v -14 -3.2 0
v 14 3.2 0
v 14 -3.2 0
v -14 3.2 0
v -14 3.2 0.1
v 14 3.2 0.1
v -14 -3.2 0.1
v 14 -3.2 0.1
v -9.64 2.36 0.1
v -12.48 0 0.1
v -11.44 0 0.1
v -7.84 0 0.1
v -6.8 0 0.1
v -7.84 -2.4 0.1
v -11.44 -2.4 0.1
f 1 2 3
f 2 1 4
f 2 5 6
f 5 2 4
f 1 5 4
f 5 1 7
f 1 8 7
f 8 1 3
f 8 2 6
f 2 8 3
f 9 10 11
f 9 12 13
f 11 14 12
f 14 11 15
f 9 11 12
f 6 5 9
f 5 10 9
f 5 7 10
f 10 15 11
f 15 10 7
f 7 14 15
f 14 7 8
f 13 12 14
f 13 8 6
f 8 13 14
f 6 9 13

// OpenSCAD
// file: ../p/box5-12.scad
use <../lib.scad>
function ldraw_lib__box5_12() = [
// 0 Box with 5 Faces without Any Edges
// 0 Name: box5-12.dat
// 0 Author: Chris Dee [cwdee]
// 0 !LDRAW_ORG Primitive UPDATE 2009-02
// 0 !LICENSE Licensed under CC BY 4.0 : see CAreadme.txt
// 
// 0 BFC CERTIFY CCW
  [0,"BFC","CERTIFY"],
  [0,"BFC","CCW"],
// 
// 0 !HISTORY 2009-09-03 [PTadmin] Official Update 2009-02
// 
// 
// 4 16 1 1 1 1 1 -1 -1 1 -1 -1 1 1
  [4,16,1,1,1,1,1,-1,-1,1,-1,-1,1,1],
// 4 16 -1 0 1 1 0 1 1 1 1 -1 1 1
  [4,16,-1,0,1,1,0,1,1,1,1,-1,1,1],
// 4 16 -1 0 -1 -1 0 1 -1 1 1 -1 1 -1
  [4,16,-1,0,-1,-1,0,1,-1,1,1,-1,1,-1],
// 4 16 1 0 -1 -1 0 -1 -1 1 -1 1 1 -1
  [4,16,1,0,-1,-1,0,-1,-1,1,-1,1,1,-1],
// 4 16 1 0 1 1 0 -1 1 1 -1 1 1 1
  [4,16,1,0,1,1,0,-1,1,1,-1,1,1,1],
// 0
];
module ldraw_lib__box5_12(step=0, col=false, unit=2/5, alt=false, line=0.2, solid=!$preview)
    makepoly(ldraw_lib__box5_12(), step=step, col=col, unit=unit, alt=alt, line=line, solid=solid);
ldraw_lib__box5_12(line=0.2);
// main file
use <../lib.scad>
use <../p/box5-12.scad>
function ldraw_lib__821577l() = [
// 0 Sticker  0.8 x  3.5 with Green Arrow on Black Background
// 0 Name: 821577l.dat
// 0 Author: Evert-Jan Boer [ejboer]
// 0 !LDRAW_ORG Part UPDATE 2026-07
// 0 !LICENSE Licensed under CC BY 4.0 : see CAreadme.txt
// 
// 0 BFC CERTIFY CCW
  [0,"BFC","CERTIFY"],
  [0,"BFC","CCW"],
// 
// 0 !CATEGORY Sticker
// 0 !KEYWORDS Multi Control, Set 8082
// 
// 0 !HISTORY 2026-07-30 [OrionP] Official Update 2026-07
// 
// 1 16 0 -.25 0 35 0 0 0 0.25 0 0 0 8 box5-12.dat
  [1,16,0,-.25,0,35,0,0,0,0.25,0,0,0,8, ldraw_lib__box5_12()],
// 3 2 -24.1 -.25 5.9 -31.2 -.25 0 -28.6 -.25 0
  [3,2,-24.1,-.25,5.9,-31.2,-.25,0,-28.6,-.25,0],
// 3 2 -24.1 -.25 5.9 -19.6 -.25 0 -17 -.25 0
  [3,2,-24.1,-.25,5.9,-19.6,-.25,0,-17,-.25,0],
// 4 2 -19.6 -.25 -6 -19.6 -.25 0 -28.6 -.25 0 -28.6 -.25 -6
  [4,2,-19.6,-.25,-6,-19.6,-.25,0,-28.6,-.25,0,-28.6,-.25,-6],
// 3 2 -24.1 -.25 5.9 -28.6 -.25 0 -19.6 -.25 0
  [3,2,-24.1,-.25,5.9,-28.6,-.25,0,-19.6,-.25,0],
// 3 0 35 -.25 8 -35 -.25 8 -24.1 -.25 5.9
  [3,0,35,-.25,8,-35,-.25,8,-24.1,-.25,5.9],
// 3 0 -35 -.25 8 -31.2 -.25 0 -24.1 -.25 5.9
  [3,0,-35,-.25,8,-31.2,-.25,0,-24.1,-.25,5.9],
// 3 0 -35 -.25 8 -35 -.25 -8 -31.2 -.25 0
  [3,0,-35,-.25,8,-35,-.25,-8,-31.2,-.25,0],
// 4 0 -31.2 -.25 0 -35 -.25 -8 -28.6 -.25 -6 -28.6 -.25 0
  [4,0,-31.2,-.25,0,-35,-.25,-8,-28.6,-.25,-6,-28.6,-.25,0],
// 4 0 -28.6 -.25 -6 -35 -.25 -8 35 -.25 -8 -19.6 -.25 -6
  [4,0,-28.6,-.25,-6,-35,-.25,-8,35,-.25,-8,-19.6,-.25,-6],
// 3 0 -17 -.25 0 -19.6 -.25 0 -19.6 -.25 -6
  [3,0,-17,-.25,0,-19.6,-.25,0,-19.6,-.25,-6],
// 4 0 -19.6 -.25 -6 35 -.25 -8 35 -.25 8 -17 -.25 0
  [4,0,-19.6,-.25,-6,35,-.25,-8,35,-.25,8,-17,-.25,0],
// 3 0 35 -.25 8 -24.1 -.25 5.9 -17 -.25 0
  [3,0,35,-.25,8,-24.1,-.25,5.9,-17,-.25,0],
];
module ldraw_lib__821577l(step=0, col=false, unit=2/5, alt=false, line=0.2, solid=!$preview)
    makepoly(ldraw_lib__821577l(), step=step, col=col, unit=unit, alt=alt, line=line, solid=solid);
ldraw_lib__821577l(line=0.2);
